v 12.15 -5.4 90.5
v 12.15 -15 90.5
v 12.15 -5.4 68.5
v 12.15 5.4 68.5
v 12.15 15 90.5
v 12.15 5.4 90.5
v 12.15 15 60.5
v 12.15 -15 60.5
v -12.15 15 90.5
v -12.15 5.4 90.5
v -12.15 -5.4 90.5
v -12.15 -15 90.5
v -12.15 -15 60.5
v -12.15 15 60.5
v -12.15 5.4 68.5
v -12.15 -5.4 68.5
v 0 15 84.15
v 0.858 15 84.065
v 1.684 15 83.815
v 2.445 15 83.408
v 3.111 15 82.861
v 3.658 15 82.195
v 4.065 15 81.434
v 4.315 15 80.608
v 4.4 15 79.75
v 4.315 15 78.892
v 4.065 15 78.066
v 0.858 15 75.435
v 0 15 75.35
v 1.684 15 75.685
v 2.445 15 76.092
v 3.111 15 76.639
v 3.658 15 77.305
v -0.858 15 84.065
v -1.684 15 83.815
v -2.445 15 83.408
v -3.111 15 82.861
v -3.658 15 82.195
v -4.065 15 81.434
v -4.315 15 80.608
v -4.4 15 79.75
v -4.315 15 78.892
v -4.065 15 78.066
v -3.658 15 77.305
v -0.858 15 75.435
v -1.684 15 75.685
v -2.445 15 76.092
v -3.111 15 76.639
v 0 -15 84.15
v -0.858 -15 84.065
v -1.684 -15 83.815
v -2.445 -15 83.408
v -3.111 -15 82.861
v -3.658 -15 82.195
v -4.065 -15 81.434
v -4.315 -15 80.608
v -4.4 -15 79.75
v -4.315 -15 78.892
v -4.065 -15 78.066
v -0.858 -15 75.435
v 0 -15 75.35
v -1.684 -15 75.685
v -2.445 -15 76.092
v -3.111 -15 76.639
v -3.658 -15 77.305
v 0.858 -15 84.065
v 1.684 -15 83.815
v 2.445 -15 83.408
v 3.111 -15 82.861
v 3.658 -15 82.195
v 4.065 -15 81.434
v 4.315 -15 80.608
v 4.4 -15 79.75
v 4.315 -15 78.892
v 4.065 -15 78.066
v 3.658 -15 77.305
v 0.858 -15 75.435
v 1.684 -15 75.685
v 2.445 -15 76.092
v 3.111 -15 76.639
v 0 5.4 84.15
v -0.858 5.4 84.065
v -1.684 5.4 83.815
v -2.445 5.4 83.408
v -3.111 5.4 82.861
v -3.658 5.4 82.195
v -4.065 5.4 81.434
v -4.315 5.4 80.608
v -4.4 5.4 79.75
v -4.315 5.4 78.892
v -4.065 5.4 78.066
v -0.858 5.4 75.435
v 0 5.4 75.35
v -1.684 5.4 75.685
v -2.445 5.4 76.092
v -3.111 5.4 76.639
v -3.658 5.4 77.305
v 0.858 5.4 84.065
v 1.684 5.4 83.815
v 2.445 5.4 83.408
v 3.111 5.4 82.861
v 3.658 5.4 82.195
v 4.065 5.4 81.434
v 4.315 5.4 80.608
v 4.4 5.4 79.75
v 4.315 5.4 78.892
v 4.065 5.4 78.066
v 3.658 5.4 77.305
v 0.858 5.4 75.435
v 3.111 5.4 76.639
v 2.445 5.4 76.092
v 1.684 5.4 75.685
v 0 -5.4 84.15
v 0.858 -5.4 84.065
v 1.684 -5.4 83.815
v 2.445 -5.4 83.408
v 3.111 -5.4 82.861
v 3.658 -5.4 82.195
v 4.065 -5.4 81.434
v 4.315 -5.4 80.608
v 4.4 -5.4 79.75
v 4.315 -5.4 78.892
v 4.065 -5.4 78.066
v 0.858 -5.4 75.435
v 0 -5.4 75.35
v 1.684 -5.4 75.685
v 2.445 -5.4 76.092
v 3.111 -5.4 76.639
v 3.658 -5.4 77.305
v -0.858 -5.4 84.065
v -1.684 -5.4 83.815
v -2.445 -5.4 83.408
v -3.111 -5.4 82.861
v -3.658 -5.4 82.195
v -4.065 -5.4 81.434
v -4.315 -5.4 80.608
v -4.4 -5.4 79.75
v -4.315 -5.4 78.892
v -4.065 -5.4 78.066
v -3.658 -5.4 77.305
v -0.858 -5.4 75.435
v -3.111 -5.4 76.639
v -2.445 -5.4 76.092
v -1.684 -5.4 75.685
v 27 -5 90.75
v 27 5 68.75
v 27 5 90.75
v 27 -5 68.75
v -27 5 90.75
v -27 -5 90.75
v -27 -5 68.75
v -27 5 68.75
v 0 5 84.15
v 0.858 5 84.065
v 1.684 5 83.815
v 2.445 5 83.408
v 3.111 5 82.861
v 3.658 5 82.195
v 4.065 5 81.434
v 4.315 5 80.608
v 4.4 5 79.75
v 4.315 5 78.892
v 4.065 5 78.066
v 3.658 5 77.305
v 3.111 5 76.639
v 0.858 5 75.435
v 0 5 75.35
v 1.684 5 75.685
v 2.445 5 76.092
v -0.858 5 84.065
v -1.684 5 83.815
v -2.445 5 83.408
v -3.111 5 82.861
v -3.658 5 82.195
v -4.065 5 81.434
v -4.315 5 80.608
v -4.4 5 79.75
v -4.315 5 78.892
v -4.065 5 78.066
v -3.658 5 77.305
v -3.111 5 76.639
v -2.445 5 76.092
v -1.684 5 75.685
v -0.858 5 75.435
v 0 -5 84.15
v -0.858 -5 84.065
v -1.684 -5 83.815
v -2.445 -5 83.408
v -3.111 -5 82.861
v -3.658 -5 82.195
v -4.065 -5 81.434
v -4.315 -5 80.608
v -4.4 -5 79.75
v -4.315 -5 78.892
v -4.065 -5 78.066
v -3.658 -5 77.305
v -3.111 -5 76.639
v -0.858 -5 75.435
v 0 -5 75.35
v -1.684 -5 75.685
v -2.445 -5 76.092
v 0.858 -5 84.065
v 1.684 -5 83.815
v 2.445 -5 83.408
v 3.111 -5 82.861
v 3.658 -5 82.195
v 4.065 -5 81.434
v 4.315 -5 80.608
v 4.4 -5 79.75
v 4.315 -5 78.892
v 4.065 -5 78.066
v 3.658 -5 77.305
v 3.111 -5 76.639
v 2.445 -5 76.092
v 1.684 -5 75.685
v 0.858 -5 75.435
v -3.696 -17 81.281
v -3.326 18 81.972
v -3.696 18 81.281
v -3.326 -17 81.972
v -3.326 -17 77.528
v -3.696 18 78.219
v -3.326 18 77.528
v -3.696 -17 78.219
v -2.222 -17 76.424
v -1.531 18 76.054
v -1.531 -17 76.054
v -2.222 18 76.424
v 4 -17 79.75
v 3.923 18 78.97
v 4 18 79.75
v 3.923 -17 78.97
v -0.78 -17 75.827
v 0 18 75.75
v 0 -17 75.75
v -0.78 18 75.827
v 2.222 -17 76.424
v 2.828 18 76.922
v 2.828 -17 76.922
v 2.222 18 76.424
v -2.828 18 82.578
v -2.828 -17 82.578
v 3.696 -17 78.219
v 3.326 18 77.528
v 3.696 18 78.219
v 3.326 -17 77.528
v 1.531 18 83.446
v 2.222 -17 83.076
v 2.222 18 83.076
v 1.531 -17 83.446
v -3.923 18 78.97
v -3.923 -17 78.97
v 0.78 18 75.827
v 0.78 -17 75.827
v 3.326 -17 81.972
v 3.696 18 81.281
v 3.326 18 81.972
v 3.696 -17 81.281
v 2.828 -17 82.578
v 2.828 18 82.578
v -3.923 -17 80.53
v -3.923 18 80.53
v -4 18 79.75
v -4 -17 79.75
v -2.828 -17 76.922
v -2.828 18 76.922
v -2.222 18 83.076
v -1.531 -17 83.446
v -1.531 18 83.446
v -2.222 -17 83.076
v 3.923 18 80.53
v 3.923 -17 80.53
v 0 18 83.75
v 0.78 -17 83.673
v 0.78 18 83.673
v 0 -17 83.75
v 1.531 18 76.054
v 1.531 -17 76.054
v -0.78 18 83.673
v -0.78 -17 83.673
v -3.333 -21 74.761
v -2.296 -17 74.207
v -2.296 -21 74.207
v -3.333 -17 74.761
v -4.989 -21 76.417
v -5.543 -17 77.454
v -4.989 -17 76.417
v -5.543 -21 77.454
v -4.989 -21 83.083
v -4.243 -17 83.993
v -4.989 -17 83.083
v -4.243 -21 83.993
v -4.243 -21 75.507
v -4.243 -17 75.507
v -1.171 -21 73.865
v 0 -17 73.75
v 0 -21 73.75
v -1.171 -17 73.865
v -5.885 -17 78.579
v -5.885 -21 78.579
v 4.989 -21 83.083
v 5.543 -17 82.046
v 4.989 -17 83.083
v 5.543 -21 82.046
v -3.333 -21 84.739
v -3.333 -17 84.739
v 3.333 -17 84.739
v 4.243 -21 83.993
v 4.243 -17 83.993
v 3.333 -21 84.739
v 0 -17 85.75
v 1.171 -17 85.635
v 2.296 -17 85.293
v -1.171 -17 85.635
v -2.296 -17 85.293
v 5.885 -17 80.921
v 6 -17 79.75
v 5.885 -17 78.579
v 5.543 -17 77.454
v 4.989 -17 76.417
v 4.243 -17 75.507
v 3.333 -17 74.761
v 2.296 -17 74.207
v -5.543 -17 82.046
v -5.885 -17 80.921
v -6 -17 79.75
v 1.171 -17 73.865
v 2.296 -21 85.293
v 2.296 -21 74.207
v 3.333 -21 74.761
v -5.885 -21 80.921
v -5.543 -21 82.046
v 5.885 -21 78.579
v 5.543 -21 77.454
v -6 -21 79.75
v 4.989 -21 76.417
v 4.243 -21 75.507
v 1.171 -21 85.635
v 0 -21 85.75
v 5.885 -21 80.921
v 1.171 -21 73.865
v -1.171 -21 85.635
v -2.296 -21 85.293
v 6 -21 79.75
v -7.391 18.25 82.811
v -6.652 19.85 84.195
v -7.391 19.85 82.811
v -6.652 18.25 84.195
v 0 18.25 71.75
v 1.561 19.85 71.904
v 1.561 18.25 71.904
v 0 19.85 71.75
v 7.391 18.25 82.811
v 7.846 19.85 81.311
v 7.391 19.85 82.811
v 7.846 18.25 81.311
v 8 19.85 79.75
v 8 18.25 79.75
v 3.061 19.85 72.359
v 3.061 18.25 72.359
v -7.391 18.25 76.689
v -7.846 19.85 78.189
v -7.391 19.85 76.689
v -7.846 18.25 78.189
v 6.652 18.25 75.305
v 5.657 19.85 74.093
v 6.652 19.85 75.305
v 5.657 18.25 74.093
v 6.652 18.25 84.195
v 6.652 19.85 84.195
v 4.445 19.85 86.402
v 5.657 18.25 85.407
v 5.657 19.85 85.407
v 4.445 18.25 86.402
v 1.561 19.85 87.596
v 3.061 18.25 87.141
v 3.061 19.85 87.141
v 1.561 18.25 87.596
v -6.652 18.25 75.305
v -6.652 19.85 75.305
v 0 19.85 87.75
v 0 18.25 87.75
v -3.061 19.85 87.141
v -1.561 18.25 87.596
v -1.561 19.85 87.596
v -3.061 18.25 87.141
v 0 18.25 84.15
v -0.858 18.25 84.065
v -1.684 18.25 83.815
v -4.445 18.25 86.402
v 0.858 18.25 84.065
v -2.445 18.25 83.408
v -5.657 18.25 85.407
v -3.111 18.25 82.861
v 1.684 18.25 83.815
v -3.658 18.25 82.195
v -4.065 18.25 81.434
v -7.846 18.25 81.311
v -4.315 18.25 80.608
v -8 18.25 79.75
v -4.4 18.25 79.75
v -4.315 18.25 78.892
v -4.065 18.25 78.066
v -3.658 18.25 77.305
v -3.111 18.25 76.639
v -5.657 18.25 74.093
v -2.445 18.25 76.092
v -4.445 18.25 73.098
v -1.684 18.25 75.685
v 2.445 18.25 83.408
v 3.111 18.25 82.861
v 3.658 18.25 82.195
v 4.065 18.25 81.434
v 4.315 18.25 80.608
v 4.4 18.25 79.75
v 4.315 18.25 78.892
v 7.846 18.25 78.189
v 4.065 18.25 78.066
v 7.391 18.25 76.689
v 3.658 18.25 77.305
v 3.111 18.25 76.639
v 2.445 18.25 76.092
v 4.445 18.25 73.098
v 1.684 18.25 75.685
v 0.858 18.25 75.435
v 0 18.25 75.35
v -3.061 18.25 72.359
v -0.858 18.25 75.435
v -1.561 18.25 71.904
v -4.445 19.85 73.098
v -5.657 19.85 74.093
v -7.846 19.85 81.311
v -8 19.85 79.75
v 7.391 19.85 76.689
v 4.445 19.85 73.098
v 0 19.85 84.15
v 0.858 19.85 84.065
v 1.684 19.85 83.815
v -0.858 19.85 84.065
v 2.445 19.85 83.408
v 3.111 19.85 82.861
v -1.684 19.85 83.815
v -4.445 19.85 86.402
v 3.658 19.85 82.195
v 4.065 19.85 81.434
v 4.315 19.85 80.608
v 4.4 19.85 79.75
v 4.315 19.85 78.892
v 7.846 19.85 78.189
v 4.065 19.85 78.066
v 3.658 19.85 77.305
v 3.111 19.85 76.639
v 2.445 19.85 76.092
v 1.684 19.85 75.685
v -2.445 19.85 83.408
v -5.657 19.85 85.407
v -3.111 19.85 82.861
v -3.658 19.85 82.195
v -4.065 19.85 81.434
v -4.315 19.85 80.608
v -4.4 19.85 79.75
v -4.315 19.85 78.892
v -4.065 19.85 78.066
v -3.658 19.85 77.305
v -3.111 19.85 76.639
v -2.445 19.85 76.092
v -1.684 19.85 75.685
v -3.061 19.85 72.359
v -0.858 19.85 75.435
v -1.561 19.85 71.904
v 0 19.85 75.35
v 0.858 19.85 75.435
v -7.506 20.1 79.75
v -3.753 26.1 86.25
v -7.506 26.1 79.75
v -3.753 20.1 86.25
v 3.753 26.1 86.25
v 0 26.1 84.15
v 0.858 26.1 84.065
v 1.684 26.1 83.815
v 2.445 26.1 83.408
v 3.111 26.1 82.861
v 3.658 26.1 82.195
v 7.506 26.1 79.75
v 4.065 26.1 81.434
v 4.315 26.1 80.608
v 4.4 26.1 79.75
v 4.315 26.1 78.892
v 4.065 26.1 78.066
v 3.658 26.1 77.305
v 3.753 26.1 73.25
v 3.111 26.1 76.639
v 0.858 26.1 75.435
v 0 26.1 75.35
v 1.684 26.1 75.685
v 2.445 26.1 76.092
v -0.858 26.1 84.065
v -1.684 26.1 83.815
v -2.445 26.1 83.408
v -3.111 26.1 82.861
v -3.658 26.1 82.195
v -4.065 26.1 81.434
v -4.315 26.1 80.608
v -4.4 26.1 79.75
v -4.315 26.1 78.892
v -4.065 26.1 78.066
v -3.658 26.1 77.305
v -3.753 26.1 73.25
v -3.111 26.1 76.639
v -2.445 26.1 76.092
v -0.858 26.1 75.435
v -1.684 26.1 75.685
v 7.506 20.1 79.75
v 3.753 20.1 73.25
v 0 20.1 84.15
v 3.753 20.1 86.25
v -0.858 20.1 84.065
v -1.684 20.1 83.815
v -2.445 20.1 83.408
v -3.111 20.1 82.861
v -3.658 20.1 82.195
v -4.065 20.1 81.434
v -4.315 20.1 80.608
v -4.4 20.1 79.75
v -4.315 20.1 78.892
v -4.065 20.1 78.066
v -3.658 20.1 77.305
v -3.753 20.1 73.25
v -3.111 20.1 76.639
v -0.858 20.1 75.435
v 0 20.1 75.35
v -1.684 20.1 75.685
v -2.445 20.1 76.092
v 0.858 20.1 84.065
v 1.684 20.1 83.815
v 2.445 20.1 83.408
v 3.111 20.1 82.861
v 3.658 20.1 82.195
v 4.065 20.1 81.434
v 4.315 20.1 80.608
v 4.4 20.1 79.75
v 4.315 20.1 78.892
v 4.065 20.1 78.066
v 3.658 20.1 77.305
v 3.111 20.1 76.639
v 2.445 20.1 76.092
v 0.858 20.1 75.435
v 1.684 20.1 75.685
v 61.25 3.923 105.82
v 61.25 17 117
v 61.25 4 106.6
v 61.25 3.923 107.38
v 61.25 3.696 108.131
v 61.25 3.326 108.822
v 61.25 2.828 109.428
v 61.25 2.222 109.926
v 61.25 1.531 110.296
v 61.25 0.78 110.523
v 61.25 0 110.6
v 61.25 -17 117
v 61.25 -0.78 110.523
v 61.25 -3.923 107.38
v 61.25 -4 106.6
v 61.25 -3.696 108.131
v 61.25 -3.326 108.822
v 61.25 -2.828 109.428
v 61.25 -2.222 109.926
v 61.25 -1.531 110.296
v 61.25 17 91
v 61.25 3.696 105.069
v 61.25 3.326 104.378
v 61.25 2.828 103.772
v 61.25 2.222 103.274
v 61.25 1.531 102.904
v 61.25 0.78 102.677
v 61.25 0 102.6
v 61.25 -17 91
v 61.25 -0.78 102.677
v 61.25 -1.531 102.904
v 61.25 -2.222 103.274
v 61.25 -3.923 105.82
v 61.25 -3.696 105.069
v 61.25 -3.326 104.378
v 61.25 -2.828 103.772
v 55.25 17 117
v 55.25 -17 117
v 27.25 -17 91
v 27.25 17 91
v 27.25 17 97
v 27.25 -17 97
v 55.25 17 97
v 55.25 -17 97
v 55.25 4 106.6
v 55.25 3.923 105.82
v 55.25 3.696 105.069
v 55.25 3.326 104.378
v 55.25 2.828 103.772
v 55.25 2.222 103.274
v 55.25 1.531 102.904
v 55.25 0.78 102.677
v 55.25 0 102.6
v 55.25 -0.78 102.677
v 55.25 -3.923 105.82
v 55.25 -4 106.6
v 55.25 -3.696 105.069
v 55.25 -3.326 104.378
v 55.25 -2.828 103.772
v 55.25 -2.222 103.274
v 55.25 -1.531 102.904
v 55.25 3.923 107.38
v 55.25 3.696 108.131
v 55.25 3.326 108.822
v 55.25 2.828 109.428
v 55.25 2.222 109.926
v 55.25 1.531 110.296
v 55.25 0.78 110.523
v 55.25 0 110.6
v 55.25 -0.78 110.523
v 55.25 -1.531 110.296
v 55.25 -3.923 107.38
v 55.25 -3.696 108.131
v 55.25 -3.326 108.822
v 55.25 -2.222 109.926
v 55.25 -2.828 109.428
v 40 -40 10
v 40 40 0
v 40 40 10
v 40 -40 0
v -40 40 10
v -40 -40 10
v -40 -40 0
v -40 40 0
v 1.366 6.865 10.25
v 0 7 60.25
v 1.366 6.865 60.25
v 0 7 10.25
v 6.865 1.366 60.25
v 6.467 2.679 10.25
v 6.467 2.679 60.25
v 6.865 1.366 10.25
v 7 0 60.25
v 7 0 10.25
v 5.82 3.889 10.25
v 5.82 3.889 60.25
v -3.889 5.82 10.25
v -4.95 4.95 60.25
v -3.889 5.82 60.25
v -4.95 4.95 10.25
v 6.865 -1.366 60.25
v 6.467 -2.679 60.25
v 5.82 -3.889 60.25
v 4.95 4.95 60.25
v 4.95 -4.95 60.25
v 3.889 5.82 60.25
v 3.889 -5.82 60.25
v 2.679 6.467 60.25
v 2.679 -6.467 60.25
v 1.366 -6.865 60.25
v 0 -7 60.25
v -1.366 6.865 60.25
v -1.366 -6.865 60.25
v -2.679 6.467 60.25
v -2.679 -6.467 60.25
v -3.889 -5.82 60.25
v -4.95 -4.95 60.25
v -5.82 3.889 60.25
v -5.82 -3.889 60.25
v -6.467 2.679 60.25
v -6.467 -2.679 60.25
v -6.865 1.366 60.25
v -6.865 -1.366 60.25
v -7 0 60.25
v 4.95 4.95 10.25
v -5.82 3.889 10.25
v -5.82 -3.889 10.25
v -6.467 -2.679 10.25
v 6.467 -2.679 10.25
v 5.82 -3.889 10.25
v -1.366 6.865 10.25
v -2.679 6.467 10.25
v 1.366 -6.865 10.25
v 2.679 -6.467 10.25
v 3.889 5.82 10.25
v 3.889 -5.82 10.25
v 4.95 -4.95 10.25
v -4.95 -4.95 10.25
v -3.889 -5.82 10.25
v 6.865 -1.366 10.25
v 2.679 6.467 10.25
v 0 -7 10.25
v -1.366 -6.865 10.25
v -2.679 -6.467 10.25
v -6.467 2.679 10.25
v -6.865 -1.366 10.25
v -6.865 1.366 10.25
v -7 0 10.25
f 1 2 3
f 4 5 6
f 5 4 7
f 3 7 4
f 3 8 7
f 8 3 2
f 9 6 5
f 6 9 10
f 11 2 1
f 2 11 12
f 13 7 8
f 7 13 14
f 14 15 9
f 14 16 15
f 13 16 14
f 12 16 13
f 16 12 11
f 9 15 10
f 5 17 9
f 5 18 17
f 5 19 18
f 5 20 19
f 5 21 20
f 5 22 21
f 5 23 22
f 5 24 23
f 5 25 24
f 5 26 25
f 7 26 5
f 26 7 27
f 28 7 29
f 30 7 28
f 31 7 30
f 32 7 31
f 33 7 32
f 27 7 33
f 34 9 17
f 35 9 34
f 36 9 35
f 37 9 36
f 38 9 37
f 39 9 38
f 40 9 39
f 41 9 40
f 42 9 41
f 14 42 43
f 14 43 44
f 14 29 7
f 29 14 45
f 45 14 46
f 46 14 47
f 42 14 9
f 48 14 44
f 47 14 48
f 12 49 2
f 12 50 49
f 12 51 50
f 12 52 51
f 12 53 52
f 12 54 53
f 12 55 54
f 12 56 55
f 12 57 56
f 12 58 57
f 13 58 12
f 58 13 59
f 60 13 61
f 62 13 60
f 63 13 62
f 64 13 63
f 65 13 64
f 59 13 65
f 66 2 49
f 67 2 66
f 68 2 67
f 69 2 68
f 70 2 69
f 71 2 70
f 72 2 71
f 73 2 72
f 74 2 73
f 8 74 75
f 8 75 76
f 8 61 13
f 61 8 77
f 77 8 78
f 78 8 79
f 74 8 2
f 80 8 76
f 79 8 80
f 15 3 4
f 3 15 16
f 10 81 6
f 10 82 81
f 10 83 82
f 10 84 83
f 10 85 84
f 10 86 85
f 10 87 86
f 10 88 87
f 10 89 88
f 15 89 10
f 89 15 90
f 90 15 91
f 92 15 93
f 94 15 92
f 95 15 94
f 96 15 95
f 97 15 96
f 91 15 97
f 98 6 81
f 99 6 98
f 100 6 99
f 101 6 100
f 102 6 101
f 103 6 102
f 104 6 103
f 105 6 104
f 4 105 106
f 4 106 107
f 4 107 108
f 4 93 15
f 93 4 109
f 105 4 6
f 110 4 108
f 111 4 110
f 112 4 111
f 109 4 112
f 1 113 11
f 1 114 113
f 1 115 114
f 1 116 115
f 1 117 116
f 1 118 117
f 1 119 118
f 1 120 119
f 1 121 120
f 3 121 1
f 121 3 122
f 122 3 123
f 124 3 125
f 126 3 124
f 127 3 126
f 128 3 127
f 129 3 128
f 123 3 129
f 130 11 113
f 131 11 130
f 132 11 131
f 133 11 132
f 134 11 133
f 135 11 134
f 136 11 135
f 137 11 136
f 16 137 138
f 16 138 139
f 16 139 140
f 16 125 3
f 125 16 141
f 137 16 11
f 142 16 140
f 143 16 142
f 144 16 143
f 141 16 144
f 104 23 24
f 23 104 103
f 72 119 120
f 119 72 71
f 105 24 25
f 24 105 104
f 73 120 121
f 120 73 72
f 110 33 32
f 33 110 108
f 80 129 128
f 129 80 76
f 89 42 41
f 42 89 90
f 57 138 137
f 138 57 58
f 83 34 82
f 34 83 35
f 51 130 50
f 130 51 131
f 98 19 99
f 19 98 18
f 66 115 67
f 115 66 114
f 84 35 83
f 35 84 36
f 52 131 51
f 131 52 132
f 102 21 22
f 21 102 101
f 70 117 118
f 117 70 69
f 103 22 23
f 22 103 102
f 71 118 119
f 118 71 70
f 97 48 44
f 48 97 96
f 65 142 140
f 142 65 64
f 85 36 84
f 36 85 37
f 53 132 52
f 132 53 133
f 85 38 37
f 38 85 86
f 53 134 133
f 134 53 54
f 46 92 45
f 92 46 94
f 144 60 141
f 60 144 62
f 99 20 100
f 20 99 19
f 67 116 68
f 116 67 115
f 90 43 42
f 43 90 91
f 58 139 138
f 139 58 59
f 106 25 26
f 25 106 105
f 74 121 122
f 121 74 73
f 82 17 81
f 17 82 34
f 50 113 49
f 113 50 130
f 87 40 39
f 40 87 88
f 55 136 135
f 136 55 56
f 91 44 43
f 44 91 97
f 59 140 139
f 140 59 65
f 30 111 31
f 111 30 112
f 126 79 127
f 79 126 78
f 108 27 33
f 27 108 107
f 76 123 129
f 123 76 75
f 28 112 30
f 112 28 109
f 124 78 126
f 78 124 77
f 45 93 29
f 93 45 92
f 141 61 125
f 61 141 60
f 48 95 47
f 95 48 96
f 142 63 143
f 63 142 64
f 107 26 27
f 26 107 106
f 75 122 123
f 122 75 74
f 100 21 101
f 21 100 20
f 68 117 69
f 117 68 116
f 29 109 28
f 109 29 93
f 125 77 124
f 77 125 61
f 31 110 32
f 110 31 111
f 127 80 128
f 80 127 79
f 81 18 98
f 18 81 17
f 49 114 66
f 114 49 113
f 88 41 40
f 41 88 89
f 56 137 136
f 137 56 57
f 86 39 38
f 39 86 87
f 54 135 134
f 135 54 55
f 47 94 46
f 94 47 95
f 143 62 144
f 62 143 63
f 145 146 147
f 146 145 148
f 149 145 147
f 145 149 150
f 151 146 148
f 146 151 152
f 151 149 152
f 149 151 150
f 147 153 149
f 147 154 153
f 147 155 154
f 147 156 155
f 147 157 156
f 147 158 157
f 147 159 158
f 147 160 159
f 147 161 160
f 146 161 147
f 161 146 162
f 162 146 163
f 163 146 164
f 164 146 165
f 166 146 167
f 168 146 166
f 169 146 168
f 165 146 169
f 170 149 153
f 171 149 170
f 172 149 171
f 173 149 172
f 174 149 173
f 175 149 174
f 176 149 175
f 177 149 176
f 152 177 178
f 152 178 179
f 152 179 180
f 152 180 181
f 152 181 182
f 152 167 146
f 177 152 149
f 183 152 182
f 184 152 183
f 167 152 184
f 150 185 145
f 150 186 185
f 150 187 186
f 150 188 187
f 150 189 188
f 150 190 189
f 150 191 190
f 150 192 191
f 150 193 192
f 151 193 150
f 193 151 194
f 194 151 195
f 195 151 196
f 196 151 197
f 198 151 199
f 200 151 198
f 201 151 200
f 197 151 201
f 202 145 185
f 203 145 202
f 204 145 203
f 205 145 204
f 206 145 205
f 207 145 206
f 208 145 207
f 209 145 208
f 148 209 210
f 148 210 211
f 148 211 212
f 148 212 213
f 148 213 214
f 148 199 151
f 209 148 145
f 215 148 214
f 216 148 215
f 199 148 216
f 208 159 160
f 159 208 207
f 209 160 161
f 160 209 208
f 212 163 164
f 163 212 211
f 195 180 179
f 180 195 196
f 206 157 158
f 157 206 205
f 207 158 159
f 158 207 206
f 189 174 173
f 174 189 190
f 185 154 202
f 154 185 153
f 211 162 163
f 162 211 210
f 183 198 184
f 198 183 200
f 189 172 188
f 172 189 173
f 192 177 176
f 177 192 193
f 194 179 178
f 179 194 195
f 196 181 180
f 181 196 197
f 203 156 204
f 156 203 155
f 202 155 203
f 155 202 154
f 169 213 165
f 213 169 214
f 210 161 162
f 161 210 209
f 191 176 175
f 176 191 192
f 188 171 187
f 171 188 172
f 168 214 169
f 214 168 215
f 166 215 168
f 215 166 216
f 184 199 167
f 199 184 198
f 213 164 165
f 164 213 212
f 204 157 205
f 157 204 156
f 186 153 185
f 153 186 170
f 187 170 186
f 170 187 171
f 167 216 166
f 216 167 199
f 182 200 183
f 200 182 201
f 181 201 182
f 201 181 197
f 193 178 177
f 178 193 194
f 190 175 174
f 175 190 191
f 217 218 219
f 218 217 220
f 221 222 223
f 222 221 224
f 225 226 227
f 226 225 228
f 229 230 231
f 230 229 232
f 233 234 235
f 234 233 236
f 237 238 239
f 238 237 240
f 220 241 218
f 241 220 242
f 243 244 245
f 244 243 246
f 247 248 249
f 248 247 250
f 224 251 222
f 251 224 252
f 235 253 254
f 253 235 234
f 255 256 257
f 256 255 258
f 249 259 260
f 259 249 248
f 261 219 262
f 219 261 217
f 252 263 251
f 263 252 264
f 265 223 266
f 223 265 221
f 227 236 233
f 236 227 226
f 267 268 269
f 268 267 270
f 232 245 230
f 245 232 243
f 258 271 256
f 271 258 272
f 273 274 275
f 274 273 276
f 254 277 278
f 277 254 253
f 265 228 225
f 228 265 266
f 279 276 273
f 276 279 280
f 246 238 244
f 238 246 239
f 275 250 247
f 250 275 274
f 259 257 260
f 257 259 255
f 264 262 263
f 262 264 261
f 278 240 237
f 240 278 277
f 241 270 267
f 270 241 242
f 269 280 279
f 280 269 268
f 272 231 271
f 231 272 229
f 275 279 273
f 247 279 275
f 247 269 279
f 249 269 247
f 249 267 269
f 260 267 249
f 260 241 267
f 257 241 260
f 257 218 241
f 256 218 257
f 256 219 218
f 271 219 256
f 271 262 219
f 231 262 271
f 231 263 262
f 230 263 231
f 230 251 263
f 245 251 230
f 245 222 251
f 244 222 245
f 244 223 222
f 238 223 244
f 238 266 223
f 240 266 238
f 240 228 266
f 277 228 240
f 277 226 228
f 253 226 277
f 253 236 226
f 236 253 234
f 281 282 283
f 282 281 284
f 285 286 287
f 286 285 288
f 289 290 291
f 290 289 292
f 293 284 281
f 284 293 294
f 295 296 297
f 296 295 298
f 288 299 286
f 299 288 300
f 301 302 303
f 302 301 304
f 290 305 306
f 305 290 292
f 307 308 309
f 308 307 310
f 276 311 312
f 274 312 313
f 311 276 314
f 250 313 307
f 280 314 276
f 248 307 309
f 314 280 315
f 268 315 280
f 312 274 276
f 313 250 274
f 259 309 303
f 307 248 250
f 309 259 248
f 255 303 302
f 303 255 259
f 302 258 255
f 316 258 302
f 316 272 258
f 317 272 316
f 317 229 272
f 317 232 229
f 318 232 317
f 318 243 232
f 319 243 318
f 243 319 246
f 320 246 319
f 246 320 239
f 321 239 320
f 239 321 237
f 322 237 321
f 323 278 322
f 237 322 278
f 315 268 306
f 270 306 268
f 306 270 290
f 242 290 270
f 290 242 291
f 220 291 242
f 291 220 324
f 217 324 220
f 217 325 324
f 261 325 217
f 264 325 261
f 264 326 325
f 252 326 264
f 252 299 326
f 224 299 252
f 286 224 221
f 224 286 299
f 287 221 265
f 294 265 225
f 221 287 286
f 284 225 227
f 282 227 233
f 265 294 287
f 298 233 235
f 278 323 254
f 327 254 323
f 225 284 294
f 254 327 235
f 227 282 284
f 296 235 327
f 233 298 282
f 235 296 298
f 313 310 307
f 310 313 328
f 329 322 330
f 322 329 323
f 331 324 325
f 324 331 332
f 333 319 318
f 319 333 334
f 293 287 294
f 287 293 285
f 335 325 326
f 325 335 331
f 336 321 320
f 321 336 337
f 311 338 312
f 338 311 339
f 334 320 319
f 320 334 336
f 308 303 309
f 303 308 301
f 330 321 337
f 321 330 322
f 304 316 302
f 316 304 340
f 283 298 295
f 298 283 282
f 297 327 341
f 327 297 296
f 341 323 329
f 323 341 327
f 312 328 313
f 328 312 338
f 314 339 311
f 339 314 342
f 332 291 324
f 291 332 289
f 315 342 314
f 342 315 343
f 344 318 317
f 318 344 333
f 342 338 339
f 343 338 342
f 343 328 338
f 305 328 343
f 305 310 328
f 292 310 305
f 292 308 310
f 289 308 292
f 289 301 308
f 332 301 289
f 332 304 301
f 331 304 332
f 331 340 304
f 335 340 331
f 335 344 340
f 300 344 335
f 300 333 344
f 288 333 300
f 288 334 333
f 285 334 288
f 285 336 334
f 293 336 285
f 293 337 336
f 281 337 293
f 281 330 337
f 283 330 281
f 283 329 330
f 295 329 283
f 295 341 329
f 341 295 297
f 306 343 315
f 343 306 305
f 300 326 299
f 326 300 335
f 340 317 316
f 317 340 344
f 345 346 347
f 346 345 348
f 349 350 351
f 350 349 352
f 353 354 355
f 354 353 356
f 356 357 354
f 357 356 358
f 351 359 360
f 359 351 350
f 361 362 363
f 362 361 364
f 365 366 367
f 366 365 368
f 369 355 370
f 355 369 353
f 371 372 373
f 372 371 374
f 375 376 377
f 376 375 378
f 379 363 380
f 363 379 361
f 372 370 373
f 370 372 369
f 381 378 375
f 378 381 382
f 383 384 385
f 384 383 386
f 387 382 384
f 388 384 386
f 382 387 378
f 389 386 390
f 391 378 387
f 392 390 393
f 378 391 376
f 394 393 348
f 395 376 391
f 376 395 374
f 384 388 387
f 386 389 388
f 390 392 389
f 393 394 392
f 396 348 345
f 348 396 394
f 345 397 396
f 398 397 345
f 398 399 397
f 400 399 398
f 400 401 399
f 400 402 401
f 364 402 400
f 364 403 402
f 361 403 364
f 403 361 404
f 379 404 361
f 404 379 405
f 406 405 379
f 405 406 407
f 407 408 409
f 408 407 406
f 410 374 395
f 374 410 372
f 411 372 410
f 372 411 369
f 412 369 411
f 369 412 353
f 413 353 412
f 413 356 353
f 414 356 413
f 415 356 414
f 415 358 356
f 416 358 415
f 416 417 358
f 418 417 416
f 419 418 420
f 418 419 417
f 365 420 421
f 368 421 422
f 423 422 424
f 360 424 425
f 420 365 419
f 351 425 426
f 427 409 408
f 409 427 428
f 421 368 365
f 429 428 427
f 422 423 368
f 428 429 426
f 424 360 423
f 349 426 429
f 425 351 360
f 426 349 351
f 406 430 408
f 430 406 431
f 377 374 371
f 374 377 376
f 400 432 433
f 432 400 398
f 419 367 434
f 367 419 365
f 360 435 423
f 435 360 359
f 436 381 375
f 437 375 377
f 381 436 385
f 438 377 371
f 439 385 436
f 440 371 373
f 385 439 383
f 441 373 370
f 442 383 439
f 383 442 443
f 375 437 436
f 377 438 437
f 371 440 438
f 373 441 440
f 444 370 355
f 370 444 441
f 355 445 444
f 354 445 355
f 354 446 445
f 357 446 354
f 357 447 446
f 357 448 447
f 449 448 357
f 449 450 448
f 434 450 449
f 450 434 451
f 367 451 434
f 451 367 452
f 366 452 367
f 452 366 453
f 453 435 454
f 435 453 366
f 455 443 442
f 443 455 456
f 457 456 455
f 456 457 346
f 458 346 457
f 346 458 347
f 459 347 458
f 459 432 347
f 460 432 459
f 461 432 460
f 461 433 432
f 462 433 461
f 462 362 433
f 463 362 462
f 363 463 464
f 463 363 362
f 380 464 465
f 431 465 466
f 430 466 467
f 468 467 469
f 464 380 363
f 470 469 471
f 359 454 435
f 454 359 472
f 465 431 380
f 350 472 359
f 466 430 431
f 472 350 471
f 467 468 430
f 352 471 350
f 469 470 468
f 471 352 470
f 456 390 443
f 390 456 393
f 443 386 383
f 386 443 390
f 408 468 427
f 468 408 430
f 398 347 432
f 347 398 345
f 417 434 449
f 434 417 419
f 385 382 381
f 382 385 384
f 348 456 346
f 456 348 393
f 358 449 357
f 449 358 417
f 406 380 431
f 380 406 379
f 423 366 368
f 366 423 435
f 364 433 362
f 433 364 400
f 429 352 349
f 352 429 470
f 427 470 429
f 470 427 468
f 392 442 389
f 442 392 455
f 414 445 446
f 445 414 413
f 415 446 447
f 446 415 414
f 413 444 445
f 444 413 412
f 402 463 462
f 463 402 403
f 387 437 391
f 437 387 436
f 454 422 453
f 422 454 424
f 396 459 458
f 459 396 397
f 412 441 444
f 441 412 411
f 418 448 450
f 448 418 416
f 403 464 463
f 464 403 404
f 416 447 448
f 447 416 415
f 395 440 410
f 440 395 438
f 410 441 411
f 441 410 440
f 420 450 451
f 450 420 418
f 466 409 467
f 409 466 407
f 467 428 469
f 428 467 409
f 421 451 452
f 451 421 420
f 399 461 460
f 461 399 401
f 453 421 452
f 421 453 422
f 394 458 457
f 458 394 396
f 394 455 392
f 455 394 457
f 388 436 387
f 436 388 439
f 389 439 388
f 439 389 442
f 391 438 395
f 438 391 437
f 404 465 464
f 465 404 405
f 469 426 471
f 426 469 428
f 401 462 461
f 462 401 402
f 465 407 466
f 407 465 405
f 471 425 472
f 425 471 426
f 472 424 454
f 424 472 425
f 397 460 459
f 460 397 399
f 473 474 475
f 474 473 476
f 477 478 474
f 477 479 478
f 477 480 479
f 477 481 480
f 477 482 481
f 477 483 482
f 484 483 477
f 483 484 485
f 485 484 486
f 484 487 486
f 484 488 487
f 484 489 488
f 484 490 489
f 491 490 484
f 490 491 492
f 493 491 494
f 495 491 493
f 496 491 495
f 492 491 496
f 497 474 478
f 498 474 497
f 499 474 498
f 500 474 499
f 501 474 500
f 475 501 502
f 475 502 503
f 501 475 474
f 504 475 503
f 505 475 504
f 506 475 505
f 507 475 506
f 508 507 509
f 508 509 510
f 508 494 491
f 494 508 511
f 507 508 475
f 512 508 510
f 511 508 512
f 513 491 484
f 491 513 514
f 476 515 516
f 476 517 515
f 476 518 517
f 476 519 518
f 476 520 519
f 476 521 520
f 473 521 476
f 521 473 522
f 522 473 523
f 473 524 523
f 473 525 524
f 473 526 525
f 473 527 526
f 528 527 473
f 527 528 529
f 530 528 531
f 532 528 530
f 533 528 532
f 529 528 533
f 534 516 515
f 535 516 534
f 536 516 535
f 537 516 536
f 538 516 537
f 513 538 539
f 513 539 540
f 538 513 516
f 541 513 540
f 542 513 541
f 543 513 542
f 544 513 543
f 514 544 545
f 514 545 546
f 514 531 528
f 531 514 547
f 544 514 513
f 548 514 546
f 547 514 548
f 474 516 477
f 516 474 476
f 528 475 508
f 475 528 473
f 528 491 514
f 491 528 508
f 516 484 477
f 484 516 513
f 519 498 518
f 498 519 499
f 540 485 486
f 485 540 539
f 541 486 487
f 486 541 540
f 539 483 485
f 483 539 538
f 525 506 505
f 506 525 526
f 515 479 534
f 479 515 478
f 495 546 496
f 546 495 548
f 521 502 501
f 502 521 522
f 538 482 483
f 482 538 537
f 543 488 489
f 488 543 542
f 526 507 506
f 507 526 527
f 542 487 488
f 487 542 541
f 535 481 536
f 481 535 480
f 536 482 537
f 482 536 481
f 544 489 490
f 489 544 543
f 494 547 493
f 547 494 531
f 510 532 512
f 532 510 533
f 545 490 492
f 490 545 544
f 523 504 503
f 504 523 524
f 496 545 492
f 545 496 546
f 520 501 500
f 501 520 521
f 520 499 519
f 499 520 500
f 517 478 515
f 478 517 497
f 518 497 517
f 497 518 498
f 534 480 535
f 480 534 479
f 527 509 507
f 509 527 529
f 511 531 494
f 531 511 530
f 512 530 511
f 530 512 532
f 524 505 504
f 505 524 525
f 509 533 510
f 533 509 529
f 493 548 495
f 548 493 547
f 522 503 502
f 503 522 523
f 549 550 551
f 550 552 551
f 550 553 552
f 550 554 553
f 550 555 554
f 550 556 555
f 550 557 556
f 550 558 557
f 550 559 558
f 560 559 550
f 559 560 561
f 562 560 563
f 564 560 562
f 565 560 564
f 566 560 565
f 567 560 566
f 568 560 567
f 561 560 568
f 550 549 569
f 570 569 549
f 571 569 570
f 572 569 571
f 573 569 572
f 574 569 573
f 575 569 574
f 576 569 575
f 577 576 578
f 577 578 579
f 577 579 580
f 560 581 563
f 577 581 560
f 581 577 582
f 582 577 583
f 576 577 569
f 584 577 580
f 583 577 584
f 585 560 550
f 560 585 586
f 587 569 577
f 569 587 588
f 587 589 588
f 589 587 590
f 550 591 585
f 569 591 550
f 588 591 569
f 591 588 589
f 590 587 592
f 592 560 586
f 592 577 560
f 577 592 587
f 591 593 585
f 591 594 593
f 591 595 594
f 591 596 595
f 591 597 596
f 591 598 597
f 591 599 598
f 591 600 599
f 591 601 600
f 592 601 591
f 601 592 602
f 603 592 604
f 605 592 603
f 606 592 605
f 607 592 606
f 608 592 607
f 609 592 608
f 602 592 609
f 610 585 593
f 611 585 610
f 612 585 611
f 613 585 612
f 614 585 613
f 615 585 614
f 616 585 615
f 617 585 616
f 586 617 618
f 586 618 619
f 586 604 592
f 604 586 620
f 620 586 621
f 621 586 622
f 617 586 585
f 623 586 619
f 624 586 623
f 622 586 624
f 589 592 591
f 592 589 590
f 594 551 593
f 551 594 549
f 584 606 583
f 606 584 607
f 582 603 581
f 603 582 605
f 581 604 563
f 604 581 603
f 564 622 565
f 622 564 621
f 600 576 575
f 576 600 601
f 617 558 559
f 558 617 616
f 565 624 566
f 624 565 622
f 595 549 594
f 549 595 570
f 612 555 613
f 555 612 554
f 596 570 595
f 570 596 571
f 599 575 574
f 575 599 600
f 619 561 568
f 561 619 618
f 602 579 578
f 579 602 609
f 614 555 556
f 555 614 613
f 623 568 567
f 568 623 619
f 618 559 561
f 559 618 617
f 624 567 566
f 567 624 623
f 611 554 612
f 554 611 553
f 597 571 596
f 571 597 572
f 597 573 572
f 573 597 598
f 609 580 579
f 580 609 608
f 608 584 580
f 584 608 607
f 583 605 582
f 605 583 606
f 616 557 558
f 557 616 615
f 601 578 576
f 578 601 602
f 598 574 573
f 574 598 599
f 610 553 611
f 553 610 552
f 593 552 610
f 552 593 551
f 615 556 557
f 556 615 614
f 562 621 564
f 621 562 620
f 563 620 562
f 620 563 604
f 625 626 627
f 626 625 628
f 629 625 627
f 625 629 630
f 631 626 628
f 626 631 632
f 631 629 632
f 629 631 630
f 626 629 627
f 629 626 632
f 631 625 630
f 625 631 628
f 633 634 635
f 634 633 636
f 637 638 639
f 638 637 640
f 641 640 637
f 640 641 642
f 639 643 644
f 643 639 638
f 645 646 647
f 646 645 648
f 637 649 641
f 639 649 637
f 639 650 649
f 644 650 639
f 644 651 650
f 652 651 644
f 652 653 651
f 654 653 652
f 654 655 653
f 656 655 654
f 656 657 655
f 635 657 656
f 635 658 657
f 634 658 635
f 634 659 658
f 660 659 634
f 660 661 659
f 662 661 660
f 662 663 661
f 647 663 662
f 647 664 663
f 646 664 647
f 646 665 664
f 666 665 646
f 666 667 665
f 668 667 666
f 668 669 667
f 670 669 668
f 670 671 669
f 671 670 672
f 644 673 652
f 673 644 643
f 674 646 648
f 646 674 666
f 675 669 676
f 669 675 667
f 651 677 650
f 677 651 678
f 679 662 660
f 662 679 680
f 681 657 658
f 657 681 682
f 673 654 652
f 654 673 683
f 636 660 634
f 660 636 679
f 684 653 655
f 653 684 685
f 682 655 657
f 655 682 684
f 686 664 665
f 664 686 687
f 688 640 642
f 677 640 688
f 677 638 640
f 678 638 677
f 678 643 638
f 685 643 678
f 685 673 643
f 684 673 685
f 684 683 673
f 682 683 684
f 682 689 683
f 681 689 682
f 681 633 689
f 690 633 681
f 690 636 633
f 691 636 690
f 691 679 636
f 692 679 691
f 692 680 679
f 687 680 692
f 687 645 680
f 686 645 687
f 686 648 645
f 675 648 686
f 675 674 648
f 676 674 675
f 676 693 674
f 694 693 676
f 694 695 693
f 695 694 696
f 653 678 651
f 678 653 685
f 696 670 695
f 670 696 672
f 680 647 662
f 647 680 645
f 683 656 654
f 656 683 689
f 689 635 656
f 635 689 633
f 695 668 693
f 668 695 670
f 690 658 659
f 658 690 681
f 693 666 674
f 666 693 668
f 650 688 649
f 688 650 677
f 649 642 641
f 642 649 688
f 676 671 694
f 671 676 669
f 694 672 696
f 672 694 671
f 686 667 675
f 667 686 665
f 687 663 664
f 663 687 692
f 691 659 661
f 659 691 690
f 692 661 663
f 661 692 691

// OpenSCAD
$fn = 32;

// ------------------------------------------------------------------------
// Lamp arm: column d14 x 50 mm, arm 54 mm
// Every part is its own module, assembly() places every instance.
// ------------------------------------------------------------------------

// --- part 1 ---
module lamp_base() {
  difference() {
    translate([-40, -40, 0]) cube([80, 80, 10]);
  }
}

// --- part 2 ---
module lamp_column() {
  cylinder(h = 50, d = 14);
}

// --- part 3 ---
module head_fork() {
  difference() {
    translate([-12.15, -15, 0]) cube([24.3, 30, 30]);
    translate([-13.15, -5.4, 8]) cube([26.3, 10.8, 23]);
    translate([0, 0, 19.25]) rotate([90, 0, 0]) cylinder(h = 32, d = 8.8, center = true);
  }
}

// --- part 4 ---
module lamp_arm() {
  difference() {
    translate([-27, -5, 0]) cube([54, 10, 22]);
    translate([0, 0, 11]) rotate([90, 0, 0]) cylinder(h = 12, d = 8.8, center = true);
  }
}

// --- part 5 ---
module arm_pin() {
  rotate([0, 90, 0]) cylinder(h = 36, d = 8, center = true);
  translate([-21, 0, 0]) rotate([0, 90, 0]) cylinder(h = 4, d = 12);
}

// --- part 6 ---
module arm_washer() {
  difference() {
      translate([0, 0, 0]) cylinder(h = 1.6, d = 16);
      translate([0, 0, -1]) cylinder(h = 3.6, d = 8.8);
    }
}

// --- part 7 ---
module arm_nut() {
  difference() {
    linear_extrude(height = 6) polygon(points = [[7.506, 0], [3.753, 6.5], [-3.753, 6.5], [-7.506, 0], [-3.753, -6.5], [3.753, -6.5]]);
    translate([0, 0, -1]) cylinder(h = 8, d = 8.8);
  }
}

// --- part 8 ---
module shade_bracket() {
  difference() {
    translate([-17, -17, 0]) cube([34, 34, 26]);
    translate([-18, -18, 6]) cube([29, 36, 21]);
    translate([14, 0, 15.6]) rotate([0, 90, 0]) cylinder(h = 8, d = 8, center = true);
  }
}

// --- assembly ---
module assembly() {
  color([0.80, 0.24, 0.20]) translate([0, 0, 0]) rotate([0, 0, 0]) lamp_base();
  color([0.20, 0.45, 0.75]) translate([0, 0, 10.25]) rotate([0, 0, 0]) lamp_column();
  color([0.25, 0.62, 0.32]) translate([0, 0, 60.5]) rotate([0, 0, 0]) head_fork();
  color([0.92, 0.70, 0.18]) translate([0, 0, 68.75]) rotate([0, 0, 0]) lamp_arm();
  color([0.58, 0.35, 0.70]) translate([0, 0, 79.75]) rotate([0, 0, 90]) arm_pin();
  color([0.16, 0.66, 0.66]) translate([0, 19.85, 79.75]) rotate([90, 0, 0]) arm_washer();
  color([0.85, 0.48, 0.18]) translate([0, 26.1, 79.75]) rotate([90, 0, 0]) arm_nut();
  color([0.55, 0.60, 0.65]) translate([44.25, 0, 91]) rotate([0, 0, 0]) shade_bracket();
}

assembly();
